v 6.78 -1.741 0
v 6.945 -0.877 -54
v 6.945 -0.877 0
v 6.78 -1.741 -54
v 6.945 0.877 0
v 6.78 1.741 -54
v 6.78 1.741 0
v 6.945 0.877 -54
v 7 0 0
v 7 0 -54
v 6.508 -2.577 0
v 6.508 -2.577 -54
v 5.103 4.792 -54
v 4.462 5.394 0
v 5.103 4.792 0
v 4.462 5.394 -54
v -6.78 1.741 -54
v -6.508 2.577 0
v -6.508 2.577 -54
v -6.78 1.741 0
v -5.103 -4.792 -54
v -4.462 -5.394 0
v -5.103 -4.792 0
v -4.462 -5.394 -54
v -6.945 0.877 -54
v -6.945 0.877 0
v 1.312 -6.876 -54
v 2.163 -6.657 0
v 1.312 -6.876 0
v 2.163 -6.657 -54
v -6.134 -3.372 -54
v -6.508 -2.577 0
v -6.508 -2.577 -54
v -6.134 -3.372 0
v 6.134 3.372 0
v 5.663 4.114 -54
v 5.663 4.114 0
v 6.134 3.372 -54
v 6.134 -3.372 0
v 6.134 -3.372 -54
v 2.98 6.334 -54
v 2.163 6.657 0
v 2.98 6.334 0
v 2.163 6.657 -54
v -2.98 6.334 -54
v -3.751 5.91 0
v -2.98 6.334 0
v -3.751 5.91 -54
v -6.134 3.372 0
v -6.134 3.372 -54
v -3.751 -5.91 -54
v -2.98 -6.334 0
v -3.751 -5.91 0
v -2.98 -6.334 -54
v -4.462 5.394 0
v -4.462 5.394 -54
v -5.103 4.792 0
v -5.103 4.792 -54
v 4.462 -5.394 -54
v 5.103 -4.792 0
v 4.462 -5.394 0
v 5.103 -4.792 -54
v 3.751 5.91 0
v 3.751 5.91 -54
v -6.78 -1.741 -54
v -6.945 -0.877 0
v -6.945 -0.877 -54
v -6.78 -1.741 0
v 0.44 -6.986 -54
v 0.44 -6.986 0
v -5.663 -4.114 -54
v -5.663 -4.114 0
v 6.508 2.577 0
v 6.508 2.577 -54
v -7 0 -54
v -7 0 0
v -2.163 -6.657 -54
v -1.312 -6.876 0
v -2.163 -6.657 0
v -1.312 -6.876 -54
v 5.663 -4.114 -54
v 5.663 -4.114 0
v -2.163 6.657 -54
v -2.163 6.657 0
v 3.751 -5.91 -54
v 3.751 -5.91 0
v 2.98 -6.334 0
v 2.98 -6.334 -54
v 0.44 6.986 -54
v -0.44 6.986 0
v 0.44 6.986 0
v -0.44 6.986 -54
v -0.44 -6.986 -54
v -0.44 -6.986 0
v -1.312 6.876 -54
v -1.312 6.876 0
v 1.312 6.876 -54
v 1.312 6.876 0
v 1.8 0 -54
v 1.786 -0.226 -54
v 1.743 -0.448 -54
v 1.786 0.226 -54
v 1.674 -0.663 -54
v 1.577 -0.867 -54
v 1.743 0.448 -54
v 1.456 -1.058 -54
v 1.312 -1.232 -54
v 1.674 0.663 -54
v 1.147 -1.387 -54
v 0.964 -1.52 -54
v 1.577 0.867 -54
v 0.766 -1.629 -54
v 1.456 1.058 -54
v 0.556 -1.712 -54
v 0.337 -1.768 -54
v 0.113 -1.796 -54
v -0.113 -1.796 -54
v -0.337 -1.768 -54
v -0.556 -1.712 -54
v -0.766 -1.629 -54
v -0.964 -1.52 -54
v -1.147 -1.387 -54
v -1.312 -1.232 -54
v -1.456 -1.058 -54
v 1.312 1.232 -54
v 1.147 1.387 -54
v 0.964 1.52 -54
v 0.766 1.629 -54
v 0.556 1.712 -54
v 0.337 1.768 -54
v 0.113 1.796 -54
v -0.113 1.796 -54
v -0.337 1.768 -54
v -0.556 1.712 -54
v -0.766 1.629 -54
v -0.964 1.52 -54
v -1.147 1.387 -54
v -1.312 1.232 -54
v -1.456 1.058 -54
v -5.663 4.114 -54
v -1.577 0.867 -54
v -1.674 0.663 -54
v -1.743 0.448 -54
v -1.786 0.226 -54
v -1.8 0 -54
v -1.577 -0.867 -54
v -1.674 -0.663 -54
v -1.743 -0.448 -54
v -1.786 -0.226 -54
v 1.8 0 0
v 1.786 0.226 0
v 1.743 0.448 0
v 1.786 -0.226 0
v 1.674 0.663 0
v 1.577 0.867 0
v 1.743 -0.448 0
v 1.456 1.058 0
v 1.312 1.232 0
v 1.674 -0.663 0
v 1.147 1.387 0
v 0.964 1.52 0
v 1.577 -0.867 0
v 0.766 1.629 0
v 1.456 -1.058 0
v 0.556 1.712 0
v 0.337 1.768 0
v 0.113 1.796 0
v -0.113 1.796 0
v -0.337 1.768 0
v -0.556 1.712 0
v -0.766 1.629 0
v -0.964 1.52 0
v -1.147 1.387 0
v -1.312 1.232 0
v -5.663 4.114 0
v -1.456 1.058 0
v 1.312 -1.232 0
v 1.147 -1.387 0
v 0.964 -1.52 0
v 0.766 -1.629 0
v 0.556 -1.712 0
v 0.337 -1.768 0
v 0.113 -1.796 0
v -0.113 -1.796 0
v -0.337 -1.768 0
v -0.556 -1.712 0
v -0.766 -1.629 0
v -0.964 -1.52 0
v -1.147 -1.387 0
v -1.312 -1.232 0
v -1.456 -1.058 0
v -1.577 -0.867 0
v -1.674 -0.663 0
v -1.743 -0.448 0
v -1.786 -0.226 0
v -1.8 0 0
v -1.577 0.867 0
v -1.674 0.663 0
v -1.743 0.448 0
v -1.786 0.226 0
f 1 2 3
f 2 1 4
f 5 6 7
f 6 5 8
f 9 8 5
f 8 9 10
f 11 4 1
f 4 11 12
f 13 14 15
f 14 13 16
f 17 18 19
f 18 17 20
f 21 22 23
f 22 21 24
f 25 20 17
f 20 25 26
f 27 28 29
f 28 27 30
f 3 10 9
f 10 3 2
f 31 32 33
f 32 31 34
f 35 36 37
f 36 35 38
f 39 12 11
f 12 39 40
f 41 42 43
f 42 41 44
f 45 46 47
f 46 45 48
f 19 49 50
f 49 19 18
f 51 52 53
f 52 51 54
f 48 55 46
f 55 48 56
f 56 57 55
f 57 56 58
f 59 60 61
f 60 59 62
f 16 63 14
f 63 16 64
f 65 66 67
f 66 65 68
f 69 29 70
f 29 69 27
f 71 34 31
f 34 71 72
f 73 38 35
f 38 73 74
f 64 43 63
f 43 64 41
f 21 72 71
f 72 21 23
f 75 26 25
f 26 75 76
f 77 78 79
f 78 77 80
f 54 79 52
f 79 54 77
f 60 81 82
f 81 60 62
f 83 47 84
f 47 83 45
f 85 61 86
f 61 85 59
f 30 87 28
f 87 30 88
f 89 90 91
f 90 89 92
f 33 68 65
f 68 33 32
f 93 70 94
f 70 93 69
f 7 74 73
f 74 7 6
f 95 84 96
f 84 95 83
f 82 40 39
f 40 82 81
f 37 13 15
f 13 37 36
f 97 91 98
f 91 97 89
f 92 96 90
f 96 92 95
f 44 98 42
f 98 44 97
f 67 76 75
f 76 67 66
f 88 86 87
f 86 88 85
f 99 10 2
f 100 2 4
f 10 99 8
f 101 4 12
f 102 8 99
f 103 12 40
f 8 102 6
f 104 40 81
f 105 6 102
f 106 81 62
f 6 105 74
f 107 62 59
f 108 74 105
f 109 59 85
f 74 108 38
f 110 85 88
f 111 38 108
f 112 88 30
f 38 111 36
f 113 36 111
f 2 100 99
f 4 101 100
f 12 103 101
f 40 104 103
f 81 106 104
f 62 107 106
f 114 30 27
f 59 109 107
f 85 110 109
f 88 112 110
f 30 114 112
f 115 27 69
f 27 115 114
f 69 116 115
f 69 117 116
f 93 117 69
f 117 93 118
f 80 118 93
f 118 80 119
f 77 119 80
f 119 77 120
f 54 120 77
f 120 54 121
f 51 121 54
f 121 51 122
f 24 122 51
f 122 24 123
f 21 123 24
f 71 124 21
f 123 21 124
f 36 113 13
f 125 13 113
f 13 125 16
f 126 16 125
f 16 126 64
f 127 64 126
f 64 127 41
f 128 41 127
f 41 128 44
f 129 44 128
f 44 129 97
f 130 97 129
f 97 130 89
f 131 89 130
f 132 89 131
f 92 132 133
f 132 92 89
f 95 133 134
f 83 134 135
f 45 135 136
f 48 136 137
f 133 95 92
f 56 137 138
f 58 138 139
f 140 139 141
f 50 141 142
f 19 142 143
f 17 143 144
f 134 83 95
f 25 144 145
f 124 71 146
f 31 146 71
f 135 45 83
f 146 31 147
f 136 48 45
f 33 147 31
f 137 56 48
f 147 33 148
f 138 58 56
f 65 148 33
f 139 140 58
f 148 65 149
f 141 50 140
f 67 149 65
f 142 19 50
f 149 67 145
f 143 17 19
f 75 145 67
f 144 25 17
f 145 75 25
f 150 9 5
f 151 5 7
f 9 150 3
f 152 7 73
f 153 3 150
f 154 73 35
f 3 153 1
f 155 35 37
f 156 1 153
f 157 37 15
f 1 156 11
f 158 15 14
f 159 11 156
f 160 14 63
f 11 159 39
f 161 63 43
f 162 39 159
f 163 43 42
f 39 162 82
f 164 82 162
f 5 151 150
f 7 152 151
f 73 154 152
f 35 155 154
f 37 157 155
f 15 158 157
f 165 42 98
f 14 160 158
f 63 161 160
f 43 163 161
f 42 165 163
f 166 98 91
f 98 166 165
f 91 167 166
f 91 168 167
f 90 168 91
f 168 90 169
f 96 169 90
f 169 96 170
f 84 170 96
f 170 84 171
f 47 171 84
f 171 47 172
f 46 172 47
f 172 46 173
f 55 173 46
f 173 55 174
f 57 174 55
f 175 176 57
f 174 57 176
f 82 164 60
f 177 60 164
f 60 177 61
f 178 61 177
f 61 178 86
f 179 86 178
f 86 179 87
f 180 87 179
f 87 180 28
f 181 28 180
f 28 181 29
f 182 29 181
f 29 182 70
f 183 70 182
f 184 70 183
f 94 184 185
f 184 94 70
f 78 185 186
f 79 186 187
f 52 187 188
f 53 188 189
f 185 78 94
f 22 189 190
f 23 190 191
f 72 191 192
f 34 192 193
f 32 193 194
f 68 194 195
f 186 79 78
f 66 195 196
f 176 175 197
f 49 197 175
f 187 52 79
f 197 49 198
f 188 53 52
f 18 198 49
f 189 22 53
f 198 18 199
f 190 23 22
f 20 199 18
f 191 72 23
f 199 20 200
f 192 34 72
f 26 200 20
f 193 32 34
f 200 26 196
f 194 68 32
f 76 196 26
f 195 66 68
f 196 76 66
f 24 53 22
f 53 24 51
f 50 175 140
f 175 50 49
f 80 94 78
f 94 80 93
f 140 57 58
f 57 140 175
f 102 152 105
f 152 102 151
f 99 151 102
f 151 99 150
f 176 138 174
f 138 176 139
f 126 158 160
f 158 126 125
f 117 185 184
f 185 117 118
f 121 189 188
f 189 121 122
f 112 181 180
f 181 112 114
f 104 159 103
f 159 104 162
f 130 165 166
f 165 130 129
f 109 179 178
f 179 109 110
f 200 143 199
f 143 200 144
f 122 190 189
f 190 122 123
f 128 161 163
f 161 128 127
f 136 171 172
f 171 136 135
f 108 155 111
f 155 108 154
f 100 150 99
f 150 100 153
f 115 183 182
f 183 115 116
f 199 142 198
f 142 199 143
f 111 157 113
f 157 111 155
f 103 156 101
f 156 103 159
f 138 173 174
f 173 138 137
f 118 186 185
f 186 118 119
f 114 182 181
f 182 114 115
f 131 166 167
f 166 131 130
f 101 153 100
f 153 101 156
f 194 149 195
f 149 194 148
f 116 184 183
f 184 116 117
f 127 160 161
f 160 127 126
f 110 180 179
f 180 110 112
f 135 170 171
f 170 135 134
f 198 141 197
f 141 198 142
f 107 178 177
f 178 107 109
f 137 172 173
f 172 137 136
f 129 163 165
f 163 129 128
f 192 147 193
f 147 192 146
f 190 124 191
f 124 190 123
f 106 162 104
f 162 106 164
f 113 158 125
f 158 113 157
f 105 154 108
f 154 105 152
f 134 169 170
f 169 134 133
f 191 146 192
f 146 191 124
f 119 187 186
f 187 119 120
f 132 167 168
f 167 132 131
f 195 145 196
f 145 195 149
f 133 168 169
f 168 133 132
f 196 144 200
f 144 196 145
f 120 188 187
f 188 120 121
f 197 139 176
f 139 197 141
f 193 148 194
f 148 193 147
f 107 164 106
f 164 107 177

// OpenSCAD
$fn = 50;


difference() {
	union() {
		translate(v = [0, 0, -54.0000000000]) {
			cylinder(h = 54, r = 7.0000000000);
		}
	}
	union() {
		#translate(v = [0, 0, -54]) {
			cylinder(h = 54, r = 1.8000000000);
		}
	}
}
